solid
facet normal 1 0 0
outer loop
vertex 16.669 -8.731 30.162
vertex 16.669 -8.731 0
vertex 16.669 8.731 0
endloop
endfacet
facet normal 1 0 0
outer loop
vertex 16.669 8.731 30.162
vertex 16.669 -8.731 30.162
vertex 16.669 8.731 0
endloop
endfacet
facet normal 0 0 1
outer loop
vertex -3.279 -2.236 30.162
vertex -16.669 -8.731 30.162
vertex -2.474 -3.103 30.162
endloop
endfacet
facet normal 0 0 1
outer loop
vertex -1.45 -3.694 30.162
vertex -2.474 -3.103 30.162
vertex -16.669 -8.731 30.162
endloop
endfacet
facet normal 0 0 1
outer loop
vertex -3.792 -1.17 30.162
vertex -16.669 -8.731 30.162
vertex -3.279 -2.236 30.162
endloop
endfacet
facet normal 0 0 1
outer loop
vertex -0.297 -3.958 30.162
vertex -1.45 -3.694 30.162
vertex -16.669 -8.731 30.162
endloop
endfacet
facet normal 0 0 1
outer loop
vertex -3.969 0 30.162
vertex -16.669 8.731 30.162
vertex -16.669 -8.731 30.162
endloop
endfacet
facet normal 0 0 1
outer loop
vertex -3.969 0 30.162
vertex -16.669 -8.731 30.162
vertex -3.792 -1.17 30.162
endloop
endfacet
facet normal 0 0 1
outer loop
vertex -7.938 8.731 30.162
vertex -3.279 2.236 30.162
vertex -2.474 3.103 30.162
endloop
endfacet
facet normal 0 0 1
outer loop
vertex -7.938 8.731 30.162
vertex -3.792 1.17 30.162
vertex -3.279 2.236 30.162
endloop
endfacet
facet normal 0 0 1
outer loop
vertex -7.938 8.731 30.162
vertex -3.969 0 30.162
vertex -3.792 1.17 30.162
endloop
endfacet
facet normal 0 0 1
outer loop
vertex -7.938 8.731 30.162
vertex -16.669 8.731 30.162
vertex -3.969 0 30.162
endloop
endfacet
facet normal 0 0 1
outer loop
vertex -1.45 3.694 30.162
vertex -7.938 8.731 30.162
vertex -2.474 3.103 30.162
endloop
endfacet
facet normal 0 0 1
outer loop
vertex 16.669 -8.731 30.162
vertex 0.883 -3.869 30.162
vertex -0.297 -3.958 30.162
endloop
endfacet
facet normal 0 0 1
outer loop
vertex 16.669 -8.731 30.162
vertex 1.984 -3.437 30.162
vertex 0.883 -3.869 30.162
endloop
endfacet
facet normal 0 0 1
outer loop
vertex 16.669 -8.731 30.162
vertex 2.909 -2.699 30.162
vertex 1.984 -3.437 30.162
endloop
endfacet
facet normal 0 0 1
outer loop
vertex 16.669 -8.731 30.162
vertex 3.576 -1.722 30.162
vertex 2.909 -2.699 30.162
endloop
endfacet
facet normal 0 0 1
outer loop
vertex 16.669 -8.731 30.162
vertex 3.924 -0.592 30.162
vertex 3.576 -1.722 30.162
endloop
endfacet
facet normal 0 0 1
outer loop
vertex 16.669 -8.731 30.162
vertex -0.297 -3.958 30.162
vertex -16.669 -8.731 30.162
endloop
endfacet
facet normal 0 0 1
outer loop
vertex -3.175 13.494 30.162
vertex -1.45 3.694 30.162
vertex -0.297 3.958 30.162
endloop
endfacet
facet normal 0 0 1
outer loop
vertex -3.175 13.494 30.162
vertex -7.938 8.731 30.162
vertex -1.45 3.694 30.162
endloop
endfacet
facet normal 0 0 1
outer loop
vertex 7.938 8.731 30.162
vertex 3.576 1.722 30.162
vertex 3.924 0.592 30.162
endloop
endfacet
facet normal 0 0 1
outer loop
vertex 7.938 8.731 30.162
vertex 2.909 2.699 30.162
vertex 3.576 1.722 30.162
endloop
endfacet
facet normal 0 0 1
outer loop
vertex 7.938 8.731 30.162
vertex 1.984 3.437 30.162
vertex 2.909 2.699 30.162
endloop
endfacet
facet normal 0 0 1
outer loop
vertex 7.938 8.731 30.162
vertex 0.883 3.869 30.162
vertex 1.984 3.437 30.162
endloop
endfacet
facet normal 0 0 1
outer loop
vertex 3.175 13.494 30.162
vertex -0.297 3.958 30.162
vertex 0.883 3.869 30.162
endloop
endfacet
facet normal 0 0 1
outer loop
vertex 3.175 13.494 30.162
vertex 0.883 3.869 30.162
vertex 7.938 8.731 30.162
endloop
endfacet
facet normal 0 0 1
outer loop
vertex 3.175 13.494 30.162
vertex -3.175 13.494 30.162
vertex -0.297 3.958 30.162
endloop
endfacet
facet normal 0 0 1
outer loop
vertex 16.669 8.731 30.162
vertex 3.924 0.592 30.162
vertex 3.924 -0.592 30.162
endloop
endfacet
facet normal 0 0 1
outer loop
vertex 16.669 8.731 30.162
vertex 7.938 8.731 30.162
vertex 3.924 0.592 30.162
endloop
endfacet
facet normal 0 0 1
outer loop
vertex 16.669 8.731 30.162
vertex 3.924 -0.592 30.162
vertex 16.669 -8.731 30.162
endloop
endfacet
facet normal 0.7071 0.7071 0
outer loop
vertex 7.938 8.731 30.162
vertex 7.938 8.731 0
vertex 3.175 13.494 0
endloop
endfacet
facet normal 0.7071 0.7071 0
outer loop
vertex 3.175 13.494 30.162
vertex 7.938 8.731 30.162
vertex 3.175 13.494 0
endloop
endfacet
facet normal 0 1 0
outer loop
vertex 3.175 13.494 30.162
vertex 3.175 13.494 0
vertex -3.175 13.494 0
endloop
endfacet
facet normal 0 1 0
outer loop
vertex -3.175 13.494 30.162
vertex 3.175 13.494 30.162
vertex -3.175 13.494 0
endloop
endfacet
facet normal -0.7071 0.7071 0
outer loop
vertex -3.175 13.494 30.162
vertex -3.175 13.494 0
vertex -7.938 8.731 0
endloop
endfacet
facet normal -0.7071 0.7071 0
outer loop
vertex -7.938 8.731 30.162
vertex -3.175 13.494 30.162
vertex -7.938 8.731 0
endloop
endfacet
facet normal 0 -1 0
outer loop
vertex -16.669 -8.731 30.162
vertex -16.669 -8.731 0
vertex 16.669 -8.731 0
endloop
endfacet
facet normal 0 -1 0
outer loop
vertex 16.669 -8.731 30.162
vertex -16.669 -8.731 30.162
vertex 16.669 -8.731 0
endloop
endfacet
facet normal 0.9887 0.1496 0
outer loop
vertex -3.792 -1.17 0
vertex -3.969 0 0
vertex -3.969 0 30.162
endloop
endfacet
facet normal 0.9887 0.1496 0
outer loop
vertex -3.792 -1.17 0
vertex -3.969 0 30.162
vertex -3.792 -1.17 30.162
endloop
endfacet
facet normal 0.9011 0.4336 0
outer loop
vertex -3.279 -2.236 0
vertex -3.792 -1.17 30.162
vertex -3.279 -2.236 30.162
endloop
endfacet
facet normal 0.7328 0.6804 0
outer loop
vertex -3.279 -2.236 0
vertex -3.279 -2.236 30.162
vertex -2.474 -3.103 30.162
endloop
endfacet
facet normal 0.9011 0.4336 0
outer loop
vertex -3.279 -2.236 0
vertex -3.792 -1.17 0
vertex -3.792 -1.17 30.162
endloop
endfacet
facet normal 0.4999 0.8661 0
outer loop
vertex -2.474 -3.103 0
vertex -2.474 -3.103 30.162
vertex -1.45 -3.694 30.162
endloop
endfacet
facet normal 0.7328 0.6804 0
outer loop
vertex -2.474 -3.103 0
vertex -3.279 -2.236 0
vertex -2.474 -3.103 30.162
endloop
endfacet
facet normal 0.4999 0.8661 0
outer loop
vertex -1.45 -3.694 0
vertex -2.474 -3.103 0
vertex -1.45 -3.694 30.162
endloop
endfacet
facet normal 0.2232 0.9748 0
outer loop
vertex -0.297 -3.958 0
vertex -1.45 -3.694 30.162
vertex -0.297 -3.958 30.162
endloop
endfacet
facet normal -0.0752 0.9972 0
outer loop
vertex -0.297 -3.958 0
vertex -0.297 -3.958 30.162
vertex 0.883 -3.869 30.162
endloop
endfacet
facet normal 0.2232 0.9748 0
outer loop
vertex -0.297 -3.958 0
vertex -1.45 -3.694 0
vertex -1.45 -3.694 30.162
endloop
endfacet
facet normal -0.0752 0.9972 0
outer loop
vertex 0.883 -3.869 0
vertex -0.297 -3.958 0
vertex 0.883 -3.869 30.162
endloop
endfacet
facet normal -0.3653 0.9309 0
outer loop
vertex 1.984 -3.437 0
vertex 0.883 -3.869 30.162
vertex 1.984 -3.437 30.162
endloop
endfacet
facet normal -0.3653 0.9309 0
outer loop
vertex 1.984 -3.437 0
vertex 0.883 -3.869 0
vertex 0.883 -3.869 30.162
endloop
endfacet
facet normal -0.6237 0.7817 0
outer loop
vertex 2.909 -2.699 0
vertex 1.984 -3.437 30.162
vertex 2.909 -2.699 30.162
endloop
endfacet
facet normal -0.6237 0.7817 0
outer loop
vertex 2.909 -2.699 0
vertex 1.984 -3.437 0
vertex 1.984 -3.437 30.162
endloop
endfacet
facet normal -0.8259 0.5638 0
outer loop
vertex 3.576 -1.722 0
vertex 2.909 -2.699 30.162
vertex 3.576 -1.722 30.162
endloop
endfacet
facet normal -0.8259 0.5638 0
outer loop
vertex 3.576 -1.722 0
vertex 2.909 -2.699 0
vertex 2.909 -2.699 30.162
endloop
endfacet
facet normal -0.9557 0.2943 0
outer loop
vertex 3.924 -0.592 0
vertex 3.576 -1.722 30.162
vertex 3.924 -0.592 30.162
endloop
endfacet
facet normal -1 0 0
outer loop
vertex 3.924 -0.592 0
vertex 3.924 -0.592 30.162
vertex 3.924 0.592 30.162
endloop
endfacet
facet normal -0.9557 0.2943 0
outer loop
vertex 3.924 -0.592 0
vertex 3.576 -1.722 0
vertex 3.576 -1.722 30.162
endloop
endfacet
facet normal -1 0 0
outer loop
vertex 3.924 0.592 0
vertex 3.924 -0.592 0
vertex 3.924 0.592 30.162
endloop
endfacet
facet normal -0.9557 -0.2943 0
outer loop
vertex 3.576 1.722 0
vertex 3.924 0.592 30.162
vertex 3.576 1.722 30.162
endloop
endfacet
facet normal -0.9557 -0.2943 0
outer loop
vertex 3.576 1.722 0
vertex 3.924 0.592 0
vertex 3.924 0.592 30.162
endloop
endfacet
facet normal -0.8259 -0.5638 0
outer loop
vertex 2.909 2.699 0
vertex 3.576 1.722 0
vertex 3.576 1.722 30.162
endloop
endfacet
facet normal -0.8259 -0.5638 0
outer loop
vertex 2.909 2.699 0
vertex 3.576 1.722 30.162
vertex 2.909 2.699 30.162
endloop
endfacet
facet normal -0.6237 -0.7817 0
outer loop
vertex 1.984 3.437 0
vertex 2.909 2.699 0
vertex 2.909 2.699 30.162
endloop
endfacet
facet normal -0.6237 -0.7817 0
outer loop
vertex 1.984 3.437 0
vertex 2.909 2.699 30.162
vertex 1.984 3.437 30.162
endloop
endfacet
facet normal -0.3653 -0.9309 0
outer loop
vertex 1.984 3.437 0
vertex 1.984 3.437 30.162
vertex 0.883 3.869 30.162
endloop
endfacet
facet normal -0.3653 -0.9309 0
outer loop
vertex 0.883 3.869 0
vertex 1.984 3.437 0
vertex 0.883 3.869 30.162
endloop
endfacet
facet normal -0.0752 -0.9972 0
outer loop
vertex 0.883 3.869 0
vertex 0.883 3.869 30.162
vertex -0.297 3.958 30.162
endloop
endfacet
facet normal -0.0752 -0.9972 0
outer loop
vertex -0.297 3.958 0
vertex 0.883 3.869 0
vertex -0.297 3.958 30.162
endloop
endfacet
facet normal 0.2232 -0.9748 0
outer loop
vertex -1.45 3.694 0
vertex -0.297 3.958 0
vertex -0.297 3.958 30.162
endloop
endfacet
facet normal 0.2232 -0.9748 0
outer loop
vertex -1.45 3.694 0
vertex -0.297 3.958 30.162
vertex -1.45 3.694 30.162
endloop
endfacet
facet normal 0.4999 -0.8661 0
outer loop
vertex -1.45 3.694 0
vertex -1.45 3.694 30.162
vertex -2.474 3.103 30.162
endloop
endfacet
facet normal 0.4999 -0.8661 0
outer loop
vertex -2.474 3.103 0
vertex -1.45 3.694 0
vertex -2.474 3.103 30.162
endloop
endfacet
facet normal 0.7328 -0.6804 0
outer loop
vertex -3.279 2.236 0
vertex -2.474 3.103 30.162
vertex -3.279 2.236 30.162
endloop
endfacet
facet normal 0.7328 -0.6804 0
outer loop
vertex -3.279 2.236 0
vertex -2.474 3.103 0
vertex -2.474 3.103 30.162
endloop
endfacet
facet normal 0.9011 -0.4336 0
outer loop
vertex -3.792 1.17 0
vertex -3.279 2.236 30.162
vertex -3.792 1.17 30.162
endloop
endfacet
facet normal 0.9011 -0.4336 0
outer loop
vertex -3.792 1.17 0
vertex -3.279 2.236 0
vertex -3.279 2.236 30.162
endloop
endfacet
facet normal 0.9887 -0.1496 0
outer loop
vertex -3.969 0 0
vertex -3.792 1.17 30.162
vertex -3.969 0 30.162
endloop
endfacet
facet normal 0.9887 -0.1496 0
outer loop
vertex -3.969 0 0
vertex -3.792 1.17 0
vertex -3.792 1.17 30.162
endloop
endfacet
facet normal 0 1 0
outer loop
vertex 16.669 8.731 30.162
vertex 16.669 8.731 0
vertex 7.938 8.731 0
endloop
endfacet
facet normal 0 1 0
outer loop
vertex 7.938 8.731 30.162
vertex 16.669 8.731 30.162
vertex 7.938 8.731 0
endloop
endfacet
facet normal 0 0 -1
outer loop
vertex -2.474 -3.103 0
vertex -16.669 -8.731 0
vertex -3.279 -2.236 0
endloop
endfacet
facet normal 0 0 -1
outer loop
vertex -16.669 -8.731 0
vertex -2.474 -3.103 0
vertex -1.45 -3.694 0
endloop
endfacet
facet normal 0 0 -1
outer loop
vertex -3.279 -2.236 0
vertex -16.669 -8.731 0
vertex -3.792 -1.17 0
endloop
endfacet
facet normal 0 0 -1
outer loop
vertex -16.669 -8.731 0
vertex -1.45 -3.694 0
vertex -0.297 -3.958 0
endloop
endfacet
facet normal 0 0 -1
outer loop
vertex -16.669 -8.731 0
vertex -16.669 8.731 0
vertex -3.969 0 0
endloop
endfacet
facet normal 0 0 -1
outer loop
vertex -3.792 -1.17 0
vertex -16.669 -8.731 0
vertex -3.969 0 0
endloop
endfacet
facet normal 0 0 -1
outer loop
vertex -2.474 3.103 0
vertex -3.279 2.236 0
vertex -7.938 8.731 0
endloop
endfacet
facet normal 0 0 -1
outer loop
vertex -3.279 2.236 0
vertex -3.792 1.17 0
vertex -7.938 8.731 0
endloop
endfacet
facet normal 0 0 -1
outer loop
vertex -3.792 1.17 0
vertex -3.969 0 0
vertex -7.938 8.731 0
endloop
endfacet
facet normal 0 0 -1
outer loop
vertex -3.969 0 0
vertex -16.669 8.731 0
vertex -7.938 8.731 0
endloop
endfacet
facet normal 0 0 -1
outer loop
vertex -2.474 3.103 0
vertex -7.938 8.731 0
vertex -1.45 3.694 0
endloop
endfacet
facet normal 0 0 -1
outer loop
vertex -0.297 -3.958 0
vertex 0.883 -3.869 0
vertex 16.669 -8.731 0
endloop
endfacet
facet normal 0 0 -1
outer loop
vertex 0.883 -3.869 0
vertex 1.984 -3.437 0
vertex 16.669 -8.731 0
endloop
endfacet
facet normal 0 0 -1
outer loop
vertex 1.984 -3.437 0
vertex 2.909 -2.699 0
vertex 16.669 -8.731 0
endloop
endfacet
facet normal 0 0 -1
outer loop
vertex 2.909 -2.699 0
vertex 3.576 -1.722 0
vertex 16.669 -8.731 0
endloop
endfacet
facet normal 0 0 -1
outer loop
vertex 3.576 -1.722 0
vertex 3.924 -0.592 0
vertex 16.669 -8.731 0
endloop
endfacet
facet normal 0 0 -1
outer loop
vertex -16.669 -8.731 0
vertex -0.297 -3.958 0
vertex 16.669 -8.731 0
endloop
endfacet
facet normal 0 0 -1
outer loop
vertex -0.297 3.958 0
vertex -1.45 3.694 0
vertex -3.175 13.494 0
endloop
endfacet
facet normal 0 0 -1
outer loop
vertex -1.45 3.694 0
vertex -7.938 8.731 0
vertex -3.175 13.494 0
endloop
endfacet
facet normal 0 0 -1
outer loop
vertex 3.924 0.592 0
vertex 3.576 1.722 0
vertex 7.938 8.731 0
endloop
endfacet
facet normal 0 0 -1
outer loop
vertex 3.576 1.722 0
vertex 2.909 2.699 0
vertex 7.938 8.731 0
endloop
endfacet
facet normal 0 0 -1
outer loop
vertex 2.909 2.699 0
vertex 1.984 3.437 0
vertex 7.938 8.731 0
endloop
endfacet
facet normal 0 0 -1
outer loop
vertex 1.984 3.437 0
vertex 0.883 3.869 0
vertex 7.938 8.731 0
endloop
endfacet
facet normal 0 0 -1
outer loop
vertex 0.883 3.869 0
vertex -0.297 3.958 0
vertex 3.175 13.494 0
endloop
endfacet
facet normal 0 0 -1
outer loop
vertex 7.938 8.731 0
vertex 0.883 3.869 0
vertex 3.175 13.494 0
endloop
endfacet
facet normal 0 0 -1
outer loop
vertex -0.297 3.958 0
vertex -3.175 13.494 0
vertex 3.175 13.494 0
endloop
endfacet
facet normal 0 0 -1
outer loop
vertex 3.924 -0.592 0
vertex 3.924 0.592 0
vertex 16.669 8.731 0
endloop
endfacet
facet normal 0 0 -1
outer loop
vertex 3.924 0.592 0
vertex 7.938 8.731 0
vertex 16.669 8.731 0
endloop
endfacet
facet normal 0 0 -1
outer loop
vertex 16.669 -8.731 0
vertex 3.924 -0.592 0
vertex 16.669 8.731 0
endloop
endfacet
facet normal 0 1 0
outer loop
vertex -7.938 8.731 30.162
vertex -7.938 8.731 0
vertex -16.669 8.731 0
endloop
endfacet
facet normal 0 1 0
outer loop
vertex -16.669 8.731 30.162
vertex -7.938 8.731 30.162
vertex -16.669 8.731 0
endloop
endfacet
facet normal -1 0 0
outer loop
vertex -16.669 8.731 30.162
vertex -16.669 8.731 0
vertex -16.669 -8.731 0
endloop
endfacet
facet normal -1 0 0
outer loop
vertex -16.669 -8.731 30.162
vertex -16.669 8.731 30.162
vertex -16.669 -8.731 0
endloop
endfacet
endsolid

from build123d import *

# Parameters (mm, degrees)
SKETCH1_R           = 3.96875
BOSS_EXTRUDE1_DEPTH = 30.1625


with BuildPart() as part:
    # Sketch1 → Boss-Extrude1 (new body)
    with BuildSketch(Plane.XY):
        Polygon((3.175, 13.49375), (-3.175, 13.49375), (-7.9375, 8.73125), (-16.66875, 8.73125), (-16.66875, -8.73125), (16.66875, -8.73125), (16.66875, 8.73125), (7.9375, 8.73125), align=None)
        with Locations(Location((0, 0, 0), (0, 0, 180))):
            Circle(SKETCH1_R, mode=Mode.SUBTRACT)
    extrude(amount=BOSS_EXTRUDE1_DEPTH)


solid = part.part
